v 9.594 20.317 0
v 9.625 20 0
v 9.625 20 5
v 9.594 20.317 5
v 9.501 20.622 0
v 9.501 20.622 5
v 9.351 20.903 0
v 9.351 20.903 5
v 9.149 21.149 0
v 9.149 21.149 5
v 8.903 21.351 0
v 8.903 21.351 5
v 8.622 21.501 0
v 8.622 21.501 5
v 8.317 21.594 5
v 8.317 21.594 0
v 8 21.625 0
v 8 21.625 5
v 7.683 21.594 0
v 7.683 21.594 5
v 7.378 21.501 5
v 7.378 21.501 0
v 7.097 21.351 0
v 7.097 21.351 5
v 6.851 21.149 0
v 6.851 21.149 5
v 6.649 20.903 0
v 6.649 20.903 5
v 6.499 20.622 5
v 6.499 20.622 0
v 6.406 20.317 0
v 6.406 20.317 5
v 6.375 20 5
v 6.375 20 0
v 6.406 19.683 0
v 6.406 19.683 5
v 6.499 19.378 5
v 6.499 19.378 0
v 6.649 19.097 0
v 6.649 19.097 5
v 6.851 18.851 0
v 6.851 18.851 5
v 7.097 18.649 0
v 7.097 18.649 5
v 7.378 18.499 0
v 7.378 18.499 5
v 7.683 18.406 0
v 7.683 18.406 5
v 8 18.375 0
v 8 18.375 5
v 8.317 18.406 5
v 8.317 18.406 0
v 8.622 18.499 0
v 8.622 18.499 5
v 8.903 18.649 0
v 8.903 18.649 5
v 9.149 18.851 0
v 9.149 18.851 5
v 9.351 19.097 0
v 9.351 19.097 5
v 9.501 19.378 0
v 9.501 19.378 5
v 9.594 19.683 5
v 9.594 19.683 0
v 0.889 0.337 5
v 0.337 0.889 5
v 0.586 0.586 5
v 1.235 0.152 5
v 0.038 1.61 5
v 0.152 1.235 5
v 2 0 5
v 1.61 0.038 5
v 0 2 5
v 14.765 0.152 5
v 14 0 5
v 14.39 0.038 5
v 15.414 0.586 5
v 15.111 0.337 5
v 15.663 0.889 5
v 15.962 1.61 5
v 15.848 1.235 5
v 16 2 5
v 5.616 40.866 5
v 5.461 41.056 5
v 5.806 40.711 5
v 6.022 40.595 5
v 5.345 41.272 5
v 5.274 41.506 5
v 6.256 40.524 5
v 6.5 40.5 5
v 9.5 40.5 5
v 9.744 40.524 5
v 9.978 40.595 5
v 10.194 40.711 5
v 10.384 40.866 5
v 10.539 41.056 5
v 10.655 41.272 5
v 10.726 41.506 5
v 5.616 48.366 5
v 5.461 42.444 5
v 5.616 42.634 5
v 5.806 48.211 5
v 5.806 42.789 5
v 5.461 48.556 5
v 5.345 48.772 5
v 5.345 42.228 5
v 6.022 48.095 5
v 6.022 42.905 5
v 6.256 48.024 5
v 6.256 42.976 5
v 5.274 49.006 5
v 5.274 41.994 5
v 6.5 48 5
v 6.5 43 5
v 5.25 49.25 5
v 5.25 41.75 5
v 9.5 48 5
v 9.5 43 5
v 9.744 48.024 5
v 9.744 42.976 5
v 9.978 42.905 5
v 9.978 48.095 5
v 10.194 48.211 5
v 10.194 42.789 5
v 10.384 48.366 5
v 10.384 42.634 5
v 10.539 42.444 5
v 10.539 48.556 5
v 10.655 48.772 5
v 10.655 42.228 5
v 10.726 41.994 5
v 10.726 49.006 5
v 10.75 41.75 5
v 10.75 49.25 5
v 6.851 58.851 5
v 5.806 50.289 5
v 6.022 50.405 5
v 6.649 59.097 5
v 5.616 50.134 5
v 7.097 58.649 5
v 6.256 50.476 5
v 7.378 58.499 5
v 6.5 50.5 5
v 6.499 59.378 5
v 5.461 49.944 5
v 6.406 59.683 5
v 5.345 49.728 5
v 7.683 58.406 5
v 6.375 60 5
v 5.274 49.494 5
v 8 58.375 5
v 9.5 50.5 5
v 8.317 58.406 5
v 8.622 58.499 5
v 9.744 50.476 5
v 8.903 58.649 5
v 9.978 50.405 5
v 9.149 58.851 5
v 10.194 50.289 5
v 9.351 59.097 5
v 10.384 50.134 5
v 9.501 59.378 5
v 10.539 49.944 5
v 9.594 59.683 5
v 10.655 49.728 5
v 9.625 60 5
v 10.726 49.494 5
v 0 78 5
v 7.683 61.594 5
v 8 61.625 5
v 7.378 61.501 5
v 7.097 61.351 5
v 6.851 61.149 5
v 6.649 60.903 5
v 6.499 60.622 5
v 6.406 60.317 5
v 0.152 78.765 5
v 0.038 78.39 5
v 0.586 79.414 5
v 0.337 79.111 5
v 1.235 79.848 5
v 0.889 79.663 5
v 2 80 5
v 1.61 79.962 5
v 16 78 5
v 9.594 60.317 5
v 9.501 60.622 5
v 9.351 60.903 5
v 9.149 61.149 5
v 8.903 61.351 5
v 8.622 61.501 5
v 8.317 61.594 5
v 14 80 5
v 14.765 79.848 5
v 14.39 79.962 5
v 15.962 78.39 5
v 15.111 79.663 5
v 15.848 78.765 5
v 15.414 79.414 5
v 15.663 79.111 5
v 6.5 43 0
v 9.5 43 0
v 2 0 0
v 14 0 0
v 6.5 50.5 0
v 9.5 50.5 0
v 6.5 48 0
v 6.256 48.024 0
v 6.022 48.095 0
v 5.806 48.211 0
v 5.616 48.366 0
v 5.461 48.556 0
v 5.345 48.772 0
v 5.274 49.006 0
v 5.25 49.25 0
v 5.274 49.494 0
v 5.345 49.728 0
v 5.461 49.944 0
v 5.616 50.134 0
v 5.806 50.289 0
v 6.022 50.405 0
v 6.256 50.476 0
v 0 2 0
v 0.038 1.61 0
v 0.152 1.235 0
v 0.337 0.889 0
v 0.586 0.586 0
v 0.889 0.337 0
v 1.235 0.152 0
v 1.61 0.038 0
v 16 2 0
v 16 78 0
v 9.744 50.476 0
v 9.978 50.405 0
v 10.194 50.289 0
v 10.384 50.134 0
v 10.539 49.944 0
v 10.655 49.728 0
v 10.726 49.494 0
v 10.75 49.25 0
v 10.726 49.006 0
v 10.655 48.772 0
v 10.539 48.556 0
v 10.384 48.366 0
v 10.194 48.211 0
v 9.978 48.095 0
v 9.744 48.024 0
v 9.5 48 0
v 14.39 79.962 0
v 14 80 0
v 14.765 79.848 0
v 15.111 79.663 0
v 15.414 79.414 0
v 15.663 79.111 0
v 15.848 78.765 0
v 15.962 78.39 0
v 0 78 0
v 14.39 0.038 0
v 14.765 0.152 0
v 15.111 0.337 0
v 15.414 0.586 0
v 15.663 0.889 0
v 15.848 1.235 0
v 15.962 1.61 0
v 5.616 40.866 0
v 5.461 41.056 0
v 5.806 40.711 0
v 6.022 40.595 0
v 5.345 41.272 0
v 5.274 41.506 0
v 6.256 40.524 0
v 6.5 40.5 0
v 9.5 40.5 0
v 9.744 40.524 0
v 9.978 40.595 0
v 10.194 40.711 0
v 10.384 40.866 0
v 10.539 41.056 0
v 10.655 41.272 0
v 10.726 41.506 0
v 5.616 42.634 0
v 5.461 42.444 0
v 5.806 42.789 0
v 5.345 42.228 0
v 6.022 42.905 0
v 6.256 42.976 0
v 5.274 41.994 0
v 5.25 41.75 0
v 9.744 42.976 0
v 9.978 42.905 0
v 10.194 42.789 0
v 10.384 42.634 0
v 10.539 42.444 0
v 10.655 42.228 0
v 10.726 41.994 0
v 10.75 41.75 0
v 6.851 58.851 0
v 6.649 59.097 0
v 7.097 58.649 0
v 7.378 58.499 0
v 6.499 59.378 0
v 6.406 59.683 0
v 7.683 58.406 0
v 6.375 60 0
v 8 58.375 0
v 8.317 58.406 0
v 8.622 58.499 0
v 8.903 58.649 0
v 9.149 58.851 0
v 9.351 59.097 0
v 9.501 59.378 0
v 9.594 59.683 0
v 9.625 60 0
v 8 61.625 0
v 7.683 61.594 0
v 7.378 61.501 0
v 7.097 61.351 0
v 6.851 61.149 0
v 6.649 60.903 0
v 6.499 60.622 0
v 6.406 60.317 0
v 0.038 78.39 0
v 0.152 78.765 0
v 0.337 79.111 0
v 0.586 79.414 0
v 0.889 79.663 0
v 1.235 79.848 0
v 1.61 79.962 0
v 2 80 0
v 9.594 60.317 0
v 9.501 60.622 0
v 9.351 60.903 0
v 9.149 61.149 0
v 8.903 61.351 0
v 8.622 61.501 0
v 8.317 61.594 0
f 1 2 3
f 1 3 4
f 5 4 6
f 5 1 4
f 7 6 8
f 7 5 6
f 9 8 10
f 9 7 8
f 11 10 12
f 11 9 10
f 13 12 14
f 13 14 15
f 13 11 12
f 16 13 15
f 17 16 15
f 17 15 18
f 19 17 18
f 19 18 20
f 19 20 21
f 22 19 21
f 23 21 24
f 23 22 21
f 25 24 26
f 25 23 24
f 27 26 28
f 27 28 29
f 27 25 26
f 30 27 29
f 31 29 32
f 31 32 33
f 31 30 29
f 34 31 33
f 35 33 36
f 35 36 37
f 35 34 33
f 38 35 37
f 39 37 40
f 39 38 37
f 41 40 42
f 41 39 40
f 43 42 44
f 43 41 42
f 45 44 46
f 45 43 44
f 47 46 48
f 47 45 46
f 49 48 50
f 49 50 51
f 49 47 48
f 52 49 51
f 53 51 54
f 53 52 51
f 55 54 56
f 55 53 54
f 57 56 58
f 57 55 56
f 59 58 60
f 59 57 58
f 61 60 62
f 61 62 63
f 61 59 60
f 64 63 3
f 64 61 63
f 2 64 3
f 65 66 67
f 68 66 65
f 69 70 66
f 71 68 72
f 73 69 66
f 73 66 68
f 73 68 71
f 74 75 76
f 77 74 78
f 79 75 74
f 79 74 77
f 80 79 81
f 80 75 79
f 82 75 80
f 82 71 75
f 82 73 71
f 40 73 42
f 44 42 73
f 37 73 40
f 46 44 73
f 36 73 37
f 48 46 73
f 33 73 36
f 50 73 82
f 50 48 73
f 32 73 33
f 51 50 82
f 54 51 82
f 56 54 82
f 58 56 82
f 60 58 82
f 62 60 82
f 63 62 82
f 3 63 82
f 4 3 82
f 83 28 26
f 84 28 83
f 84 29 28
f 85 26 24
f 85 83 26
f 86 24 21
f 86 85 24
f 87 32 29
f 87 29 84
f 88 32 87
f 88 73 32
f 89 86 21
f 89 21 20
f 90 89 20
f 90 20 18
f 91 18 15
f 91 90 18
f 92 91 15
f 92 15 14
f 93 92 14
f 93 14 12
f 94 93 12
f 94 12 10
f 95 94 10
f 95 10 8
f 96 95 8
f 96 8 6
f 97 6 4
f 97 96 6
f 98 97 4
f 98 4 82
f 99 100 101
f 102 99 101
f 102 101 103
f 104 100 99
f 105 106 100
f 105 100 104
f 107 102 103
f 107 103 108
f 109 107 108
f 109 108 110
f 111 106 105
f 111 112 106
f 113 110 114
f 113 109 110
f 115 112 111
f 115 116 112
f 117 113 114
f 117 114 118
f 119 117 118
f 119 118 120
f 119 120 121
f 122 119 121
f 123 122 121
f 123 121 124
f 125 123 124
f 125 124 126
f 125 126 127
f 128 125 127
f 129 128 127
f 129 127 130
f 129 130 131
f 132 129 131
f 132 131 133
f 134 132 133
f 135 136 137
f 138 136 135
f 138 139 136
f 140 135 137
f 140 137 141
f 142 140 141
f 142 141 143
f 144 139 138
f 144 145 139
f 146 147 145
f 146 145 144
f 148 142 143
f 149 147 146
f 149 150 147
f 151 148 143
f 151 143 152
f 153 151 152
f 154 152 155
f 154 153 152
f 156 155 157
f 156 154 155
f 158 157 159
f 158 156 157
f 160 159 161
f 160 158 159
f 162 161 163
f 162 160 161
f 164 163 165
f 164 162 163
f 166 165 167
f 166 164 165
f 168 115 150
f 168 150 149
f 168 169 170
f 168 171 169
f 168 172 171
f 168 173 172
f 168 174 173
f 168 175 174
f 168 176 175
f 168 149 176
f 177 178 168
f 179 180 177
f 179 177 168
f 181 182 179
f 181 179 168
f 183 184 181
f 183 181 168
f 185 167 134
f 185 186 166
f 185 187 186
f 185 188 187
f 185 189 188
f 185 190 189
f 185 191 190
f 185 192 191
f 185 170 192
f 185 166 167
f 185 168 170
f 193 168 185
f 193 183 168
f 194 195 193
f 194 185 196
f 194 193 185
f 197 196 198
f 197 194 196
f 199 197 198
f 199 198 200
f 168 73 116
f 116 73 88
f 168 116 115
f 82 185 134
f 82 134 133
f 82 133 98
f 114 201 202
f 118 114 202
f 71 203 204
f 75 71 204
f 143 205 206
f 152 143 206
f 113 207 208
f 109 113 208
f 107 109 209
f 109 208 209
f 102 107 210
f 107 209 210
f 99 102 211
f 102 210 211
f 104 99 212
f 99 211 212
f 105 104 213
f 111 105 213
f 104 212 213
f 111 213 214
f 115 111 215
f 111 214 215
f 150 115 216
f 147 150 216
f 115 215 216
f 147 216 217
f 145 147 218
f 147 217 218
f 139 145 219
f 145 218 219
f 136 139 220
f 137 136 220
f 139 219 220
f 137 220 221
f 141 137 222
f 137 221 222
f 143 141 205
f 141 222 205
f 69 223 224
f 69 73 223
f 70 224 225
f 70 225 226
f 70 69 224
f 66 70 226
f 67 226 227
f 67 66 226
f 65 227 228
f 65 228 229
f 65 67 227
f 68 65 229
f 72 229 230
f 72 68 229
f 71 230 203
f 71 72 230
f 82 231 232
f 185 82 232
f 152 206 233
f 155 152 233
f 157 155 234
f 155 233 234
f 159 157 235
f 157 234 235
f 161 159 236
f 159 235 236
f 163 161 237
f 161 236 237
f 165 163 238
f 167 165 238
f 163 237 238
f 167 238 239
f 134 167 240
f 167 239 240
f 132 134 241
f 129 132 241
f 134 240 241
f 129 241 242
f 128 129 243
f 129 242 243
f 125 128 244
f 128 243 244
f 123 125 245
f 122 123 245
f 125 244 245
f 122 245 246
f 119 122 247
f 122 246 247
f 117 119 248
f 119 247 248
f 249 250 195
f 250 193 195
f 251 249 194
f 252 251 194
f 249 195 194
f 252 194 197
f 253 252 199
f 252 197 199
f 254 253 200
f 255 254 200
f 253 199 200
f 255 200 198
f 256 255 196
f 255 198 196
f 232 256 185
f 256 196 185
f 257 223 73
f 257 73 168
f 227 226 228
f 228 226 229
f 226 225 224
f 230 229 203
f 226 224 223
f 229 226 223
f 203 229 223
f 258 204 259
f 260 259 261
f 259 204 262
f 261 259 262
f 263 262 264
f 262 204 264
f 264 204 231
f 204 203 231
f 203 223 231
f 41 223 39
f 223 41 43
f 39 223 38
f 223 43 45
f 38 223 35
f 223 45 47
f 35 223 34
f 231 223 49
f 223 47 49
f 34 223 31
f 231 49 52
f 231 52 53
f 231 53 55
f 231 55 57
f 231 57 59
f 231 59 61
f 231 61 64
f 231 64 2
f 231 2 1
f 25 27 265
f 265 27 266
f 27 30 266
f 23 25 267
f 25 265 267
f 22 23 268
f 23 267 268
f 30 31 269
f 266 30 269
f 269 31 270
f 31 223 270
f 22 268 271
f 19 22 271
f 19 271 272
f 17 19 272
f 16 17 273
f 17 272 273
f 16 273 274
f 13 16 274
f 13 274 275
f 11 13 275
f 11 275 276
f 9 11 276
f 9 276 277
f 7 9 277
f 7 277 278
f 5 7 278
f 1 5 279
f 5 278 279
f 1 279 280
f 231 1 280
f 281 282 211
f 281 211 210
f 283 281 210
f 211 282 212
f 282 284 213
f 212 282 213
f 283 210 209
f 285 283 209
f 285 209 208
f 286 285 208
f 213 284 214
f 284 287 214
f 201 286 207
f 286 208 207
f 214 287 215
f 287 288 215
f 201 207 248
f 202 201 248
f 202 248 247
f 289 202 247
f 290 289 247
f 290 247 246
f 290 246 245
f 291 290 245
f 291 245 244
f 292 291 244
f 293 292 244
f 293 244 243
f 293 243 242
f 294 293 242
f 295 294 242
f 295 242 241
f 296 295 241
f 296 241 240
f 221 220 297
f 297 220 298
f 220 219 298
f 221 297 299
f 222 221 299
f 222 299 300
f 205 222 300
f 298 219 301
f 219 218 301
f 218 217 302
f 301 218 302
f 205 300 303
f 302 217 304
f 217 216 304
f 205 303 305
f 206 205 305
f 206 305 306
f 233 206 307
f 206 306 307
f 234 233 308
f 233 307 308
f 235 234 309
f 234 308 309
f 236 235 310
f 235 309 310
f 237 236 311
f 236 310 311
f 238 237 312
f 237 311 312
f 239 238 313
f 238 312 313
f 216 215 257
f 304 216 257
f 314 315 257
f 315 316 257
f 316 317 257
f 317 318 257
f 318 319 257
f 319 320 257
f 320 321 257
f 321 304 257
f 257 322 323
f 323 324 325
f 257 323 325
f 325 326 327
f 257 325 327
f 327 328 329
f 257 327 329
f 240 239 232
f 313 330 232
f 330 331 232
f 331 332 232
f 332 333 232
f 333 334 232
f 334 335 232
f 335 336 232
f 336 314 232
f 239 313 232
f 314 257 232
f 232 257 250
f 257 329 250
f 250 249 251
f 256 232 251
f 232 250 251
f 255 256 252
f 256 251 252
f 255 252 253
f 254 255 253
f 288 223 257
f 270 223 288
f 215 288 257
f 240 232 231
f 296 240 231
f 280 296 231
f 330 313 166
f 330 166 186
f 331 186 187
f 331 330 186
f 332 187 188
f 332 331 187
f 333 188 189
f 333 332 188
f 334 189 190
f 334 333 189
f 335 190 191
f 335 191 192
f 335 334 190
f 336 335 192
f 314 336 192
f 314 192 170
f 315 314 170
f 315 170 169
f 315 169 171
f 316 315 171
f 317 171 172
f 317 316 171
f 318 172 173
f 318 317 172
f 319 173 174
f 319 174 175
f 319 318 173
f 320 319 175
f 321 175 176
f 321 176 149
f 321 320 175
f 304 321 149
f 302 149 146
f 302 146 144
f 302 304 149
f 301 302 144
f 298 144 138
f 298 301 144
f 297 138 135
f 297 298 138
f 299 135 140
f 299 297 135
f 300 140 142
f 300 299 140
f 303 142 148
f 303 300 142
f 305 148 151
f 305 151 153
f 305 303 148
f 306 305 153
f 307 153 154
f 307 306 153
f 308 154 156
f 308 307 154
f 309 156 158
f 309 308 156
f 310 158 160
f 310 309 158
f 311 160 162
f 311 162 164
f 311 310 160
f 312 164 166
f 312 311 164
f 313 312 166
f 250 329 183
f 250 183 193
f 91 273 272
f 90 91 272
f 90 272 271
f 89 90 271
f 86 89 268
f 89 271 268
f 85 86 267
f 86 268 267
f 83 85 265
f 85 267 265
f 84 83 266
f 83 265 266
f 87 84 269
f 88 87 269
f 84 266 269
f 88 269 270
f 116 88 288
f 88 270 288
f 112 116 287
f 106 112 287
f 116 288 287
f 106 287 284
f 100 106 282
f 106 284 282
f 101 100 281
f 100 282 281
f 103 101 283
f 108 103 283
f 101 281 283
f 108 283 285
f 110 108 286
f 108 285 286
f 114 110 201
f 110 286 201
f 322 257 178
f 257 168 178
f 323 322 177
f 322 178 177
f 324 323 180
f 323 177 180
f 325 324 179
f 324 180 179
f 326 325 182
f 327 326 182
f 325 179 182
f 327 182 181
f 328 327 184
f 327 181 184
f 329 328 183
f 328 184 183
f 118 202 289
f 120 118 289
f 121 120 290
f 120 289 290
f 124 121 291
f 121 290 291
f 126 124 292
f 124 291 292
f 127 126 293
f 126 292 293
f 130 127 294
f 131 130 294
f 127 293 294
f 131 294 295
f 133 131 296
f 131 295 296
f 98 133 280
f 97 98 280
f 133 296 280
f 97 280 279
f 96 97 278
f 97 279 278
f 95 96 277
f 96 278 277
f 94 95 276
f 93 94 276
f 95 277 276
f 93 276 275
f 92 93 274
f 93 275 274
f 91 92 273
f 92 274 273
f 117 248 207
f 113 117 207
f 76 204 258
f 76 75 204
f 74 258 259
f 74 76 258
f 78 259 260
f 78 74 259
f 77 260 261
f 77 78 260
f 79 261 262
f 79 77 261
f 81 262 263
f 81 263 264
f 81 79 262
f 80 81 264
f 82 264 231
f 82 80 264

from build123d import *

# Parameters (mm, degrees)
SKETCH1_W           = 16
SKETCH1_H           = 80
SKETCH1_R           = 1.625
BOSS_EXTRUDE1_DEPTH = 5
FILLET1_R           = 2


with BuildPart() as part:
    # Sketch1 → Boss-Extrude1 (new body)
    with BuildSketch(Plane.XY):
        with Locations((8, 40)):
            Rectangle(SKETCH1_W, SKETCH1_H)
        with Locations((8, 20)):
            Circle(SKETCH1_R, mode=Mode.SUBTRACT)
        with Locations((8, 60)):
            Circle(SKETCH1_R, mode=Mode.SUBTRACT)
        with BuildLine():
            Line((6.5, 50.5), (9.5, 50.5))
            ThreePointArc((9.5, 50.5), (10.75, 49.25), (9.5, 48))
            Line((9.5, 48), (6.5, 48))
            ThreePointArc((6.5, 48), (5.25, 49.25), (6.5, 50.5))
        make_face(mode=Mode.SUBTRACT)
        with BuildLine():
            Line((6.5, 43), (9.5, 43))
            ThreePointArc((9.5, 43), (10.75, 41.75), (9.5, 40.5))
            Line((9.5, 40.5), (6.5, 40.5))
            ThreePointArc((6.5, 40.5), (5.25, 41.75), (6.5, 43))
        make_face(mode=Mode.SUBTRACT)
    extrude(amount=BOSS_EXTRUDE1_DEPTH)

    # Fillet1
    fillet1_edges = [part.edges().sort_by_distance(p)[0] for p in [
        (0, 80, 2.5),
        (16, 80, 2.5),
        (16, 0, 2.5),
        (0, 0, 2.5),
    ]]
    fillet(fillet1_edges, radius=FILLET1_R)


solid = part.part
